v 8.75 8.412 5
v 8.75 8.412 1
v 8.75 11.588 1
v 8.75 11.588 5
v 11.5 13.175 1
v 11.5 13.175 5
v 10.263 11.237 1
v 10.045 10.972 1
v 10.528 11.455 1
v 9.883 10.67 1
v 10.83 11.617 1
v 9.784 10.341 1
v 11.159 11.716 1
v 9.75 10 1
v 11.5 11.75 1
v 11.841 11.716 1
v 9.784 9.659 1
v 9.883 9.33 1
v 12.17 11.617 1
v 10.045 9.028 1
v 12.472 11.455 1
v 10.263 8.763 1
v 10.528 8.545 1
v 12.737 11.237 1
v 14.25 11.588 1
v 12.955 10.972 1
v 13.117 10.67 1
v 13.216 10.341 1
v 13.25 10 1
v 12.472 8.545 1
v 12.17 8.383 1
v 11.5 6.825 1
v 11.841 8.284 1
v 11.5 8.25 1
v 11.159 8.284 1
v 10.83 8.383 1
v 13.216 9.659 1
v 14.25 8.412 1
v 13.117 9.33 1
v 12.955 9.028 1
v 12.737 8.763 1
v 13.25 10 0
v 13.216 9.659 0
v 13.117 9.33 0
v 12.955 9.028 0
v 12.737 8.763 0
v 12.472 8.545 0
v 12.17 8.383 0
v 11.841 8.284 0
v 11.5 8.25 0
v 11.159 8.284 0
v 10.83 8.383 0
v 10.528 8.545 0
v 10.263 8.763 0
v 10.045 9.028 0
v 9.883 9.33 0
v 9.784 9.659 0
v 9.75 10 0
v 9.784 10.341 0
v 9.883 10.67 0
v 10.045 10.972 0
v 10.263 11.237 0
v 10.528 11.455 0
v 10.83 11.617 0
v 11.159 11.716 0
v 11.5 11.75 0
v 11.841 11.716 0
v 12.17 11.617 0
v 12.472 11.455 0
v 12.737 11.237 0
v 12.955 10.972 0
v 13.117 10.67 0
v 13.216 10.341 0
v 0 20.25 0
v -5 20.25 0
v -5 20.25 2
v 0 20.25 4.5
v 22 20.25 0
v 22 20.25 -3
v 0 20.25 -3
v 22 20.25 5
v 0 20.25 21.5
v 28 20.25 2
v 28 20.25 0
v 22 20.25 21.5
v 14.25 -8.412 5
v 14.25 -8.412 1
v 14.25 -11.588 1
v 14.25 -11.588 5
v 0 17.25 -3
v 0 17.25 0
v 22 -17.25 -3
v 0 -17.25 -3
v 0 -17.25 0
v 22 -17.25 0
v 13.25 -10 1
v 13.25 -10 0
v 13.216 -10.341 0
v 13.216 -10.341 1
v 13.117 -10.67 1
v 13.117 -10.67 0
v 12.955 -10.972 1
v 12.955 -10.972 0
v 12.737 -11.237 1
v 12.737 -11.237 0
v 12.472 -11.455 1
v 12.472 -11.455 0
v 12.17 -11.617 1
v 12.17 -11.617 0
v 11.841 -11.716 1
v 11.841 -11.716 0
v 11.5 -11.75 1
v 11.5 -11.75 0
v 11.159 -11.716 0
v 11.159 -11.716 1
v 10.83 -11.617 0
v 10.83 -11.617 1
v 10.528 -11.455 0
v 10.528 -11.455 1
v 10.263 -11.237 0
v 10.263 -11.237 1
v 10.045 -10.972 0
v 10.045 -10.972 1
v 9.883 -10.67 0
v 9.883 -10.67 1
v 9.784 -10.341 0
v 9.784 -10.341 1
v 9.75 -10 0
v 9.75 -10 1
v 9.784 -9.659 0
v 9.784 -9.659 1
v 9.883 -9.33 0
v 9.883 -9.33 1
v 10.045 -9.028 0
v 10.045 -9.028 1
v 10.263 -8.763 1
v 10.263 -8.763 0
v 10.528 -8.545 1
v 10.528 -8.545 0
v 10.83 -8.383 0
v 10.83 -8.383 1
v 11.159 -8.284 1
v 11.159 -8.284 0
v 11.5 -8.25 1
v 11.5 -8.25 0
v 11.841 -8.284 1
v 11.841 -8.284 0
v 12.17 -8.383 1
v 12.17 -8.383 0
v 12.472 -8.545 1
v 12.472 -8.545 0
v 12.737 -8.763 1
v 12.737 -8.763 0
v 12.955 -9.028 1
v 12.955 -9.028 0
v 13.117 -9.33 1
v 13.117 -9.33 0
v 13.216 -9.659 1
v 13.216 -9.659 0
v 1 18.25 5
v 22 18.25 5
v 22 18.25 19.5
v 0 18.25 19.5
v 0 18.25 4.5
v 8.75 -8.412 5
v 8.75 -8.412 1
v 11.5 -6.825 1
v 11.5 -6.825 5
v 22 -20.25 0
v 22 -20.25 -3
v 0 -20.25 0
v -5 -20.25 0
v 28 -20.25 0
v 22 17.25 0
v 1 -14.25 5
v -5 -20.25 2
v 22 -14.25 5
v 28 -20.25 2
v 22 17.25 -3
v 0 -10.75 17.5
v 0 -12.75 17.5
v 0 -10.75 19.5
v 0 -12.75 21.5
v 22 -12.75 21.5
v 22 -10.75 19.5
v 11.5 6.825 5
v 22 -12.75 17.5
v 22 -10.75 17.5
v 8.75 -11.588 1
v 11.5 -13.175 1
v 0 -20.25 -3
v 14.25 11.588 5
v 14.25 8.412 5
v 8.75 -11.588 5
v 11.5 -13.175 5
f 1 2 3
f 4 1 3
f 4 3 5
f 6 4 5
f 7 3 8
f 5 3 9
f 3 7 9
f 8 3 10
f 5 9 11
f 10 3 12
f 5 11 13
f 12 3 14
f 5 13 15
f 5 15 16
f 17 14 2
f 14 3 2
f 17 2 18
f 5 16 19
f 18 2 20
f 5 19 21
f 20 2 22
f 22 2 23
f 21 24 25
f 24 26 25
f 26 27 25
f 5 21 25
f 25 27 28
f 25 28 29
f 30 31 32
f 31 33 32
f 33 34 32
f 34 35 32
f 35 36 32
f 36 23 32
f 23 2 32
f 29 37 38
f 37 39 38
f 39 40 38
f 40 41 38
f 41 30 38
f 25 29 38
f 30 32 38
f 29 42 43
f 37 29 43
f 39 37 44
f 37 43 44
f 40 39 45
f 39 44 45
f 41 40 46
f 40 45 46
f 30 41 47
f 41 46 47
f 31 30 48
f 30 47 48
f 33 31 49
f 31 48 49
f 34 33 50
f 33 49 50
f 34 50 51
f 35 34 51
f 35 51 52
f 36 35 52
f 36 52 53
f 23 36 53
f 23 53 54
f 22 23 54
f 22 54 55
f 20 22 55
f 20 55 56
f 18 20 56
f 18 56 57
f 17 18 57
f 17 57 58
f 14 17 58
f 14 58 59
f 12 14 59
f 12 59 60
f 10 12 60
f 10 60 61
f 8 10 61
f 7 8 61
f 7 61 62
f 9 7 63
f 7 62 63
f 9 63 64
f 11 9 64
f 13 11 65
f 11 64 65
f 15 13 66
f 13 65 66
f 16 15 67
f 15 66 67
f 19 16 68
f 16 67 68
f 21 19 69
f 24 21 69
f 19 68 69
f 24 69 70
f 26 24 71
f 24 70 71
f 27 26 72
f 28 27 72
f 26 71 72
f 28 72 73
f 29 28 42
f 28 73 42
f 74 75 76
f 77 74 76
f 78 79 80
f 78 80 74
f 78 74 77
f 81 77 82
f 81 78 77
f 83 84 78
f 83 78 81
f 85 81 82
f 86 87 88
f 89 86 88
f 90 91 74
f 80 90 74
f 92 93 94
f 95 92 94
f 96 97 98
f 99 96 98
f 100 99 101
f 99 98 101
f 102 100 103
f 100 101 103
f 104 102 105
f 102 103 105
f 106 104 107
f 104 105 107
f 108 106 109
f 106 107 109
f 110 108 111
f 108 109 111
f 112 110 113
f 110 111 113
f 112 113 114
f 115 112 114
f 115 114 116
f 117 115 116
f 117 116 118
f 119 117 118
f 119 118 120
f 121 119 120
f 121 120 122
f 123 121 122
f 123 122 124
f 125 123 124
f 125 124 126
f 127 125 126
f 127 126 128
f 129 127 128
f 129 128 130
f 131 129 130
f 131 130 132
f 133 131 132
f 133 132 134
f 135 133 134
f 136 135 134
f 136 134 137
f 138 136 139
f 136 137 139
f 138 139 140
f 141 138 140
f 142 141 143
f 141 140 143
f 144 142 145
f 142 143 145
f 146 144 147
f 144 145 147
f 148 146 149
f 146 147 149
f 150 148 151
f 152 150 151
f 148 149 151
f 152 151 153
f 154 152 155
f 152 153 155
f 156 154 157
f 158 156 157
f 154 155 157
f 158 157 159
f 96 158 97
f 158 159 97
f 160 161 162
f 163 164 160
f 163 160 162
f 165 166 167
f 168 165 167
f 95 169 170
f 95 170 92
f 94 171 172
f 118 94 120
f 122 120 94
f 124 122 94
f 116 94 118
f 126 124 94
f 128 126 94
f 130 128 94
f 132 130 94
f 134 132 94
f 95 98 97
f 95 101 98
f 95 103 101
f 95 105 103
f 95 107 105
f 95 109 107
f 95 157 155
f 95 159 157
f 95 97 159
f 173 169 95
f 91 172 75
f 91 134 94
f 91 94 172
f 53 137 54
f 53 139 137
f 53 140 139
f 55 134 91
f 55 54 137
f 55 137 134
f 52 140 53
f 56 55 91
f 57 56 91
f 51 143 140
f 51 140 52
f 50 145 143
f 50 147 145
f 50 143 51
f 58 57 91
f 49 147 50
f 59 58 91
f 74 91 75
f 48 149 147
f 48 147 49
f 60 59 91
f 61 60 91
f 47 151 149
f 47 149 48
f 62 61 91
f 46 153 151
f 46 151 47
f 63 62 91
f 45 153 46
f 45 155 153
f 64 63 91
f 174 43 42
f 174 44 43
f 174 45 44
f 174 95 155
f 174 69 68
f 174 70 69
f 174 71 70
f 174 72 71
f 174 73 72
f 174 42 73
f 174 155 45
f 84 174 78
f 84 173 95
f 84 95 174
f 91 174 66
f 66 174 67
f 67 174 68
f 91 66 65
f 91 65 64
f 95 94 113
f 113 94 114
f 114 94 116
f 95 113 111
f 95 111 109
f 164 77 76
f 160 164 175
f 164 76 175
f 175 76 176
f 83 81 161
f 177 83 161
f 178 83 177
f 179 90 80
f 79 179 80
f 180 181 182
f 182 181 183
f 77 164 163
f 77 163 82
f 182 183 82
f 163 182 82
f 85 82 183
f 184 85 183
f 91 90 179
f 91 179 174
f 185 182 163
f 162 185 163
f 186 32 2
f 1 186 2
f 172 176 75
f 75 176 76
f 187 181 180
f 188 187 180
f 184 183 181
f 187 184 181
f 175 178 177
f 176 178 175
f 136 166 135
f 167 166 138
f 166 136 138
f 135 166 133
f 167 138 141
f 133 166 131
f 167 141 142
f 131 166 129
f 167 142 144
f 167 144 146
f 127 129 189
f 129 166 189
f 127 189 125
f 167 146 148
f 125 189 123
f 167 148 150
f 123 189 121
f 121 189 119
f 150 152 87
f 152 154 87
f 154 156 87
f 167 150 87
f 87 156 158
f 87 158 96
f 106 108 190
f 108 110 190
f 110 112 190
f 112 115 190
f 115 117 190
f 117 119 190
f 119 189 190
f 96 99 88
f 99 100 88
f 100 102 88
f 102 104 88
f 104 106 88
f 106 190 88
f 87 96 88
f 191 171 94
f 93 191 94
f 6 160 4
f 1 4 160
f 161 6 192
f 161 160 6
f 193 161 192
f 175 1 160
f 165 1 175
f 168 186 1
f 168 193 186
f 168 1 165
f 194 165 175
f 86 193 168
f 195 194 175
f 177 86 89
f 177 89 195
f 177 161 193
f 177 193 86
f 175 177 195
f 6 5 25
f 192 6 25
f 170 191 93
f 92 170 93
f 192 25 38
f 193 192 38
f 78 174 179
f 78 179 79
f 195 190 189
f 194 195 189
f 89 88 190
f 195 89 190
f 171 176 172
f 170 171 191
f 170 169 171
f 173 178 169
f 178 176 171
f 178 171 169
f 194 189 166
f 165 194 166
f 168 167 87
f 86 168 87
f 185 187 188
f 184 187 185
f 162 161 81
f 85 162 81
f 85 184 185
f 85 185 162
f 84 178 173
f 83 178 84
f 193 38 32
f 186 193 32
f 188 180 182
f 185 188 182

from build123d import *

# Parameters (mm, degrees)
F0_W          = 2
F0_H          = 14.5
F0_W_2        = 3
F0_H_2        = 3
F0_W_3        = 29
F0_H_3        = 2
F1_DEPTH      = 22
F2_DEPTH      = 28
F2_DEPTH_BACK = 5
F3_R          = 1.75
F4_DEPTH      = 5
F5_START      = -1
F5_DEPTH      = 4
F6_SIZE2      = 3
F6_SIZE       = 6


# Not quite as in the source:
# - a feature names something its author has since deleted; it is built from what else it names


with BuildPart() as f1:
    # F0 (on Right) → F1 (new body)
    with BuildSketch(Plane.YZ):
        Polygon((-20.25, 5), (-20.25, 0), (-17.25, 0), (17.25, 0), (20.25, 0), (20.25, 5), (18.25, 5), align=None)
        with Locations((19.25, 12.25)):
            Rectangle(F0_W, F0_H)
        with Locations((-18.75, -1.5)):
            Rectangle(F0_W_2, F0_H_2)
        with Locations((18.75, -1.5)):
            Rectangle(F0_W_2, F0_H_2)
        with Locations((3.75, 20.5)):
            Rectangle(F0_W_3, F0_H_3)
        with Locations((19.25, 20.5)):
            Rectangle(F0_W, F0_H_3)
        Polygon((-10.75, 17.5), (-10.75, 19.5), (-10.75, 21.5), (-12.75, 21.5), (-12.75, 17.5), align=None)
    extrude(amount=F1_DEPTH)

    # F0 (on Right) → F2 (join, two sides)
    with BuildSketch(Plane.YZ) as f2_sk:
        Polygon((-20.25, 5), (-20.25, 0), (-17.25, 0), (17.25, 0), (20.25, 0), (20.25, 5), (18.25, 5), align=None)
    extrude(amount=F2_DEPTH)
    extrude(f2_sk.sketch, amount=-F2_DEPTH_BACK)

    # F3 (on face) → F4 (cut, through all)
    with BuildSketch(Plane(origin=(0, 0, 0), x_dir=(1, 0, 0), z_dir=(0, 0, -1))):
        with Locations((11.5, 10)):
            Circle(F3_R)
        with Locations((11.5, -10)):
            Circle(F3_R)
    extrude(amount=-F4_DEPTH, mode=Mode.SUBTRACT)

    # F3 (on face) → F5 (cut)
    with BuildSketch(Plane(origin=(0, 0, 0), x_dir=(1, 0, 0), z_dir=(0, 0, -1)).offset(F5_START)):
        Polygon((8.75, -8.4122867597), (8.75, -11.5877132403), (11.5, -13.1754264805), (14.25, -11.5877132403), (14.25, -8.4122867597), (11.5, -6.8245735195), align=None)
        with Locations((11.5, -10)):
            Circle(F3_R, mode=Mode.SUBTRACT)
        Polygon((8.75, 11.5877132403), (8.75, 8.4122867597), (11.5, 6.8245735195), (14.25, 8.4122867597), (14.25, 11.5877132403), (11.5, 13.1754264805), align=None)
        with Locations((11.5, 10)):
            Circle(F3_R, mode=Mode.SUBTRACT)
    extrude(amount=-F5_DEPTH, mode=Mode.SUBTRACT)

    # F6
    f6_edges = [f1.edges().sort_by_distance(p)[0] for p in [
        (28, 0, 5),
        (11.5, -20.25, 5),
        (-5, 0, 5),
    ]]
    f6_side = f1.faces().sort_by_distance((11.51774, -0.683006, 5))[0]
    chamfer(f6_edges, length=F6_SIZE, length2=F6_SIZE2, reference=f6_side)


solid = f1.part
